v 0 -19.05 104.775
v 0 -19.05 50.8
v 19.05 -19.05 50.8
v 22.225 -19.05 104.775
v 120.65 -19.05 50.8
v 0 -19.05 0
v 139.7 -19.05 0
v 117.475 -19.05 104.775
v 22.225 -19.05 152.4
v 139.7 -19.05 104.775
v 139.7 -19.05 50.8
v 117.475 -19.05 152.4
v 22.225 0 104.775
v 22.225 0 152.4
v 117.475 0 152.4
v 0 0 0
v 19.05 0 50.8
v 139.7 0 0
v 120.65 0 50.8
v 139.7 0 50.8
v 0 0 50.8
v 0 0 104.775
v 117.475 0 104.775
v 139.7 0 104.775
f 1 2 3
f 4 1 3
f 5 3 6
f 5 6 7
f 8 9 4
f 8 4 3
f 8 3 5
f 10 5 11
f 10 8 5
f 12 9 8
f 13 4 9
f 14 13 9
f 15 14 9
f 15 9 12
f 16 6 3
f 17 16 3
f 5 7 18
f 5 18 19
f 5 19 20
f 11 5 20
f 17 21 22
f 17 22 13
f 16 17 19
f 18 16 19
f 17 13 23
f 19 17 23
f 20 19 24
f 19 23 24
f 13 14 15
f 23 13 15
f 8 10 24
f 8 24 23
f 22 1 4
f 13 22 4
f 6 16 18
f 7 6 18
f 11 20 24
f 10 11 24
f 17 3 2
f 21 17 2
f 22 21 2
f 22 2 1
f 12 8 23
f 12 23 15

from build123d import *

# Parameters (mm, degrees)
F0_W     = 139.7
F0_H     = 152.4
F1_DEPTH = 19.05
F2_W     = 22.225
F2_H     = 47.625
F3_DEPTH = 19.051
F6_DEPTH = 19.051


# Not quite as in the source:
# - a length typed as a fraction of an inch, garbled in the dataset ("3 / 203.2 mm" for 3/8 in), is restored
# - a pattern or mirror of a feature is missing from the dataset's text; its kind, count and spacing are read off the source's solid


with BuildPart() as f1:
    # F0 (on Front) → F1 (new body)
    with BuildSketch(Plane.XZ):
        with Locations((69.85, 76.2)):
            Rectangle(F0_W, F0_H)
    extrude(amount=F1_DEPTH)

    # F2 (on face) → F3 (cut, through all)
    with BuildSketch(Plane.XZ.offset(19.05)):
        with Locations((11.1125, 128.5875)):
            Rectangle(F2_W, F2_H)
    f3 = extrude(amount=-F3_DEPTH, mode=Mode.SUBTRACT)

    # F3_copies: F3 across plane
    add(f3.mirror(Plane(origin=(69.85, 0, 0), x_dir=(0, 0, 1), z_dir=(1, 0, 0))), mode=Mode.SUBTRACT)

    # F5 (on face) → F6 (cut, through all)
    with BuildSketch(Plane.XZ.offset(19.05)):
        Polygon((0, 50.8), (0, 0), (19.05, 50.8), align=None)
    f6 = extrude(amount=-F6_DEPTH, mode=Mode.SUBTRACT)

    # F6_copies: F6 across plane
    add(f6.mirror(Plane(origin=(69.85, 0, 0), x_dir=(0, 0, 1), z_dir=(1, 0, 0))), mode=Mode.SUBTRACT)


solid = f1.part
